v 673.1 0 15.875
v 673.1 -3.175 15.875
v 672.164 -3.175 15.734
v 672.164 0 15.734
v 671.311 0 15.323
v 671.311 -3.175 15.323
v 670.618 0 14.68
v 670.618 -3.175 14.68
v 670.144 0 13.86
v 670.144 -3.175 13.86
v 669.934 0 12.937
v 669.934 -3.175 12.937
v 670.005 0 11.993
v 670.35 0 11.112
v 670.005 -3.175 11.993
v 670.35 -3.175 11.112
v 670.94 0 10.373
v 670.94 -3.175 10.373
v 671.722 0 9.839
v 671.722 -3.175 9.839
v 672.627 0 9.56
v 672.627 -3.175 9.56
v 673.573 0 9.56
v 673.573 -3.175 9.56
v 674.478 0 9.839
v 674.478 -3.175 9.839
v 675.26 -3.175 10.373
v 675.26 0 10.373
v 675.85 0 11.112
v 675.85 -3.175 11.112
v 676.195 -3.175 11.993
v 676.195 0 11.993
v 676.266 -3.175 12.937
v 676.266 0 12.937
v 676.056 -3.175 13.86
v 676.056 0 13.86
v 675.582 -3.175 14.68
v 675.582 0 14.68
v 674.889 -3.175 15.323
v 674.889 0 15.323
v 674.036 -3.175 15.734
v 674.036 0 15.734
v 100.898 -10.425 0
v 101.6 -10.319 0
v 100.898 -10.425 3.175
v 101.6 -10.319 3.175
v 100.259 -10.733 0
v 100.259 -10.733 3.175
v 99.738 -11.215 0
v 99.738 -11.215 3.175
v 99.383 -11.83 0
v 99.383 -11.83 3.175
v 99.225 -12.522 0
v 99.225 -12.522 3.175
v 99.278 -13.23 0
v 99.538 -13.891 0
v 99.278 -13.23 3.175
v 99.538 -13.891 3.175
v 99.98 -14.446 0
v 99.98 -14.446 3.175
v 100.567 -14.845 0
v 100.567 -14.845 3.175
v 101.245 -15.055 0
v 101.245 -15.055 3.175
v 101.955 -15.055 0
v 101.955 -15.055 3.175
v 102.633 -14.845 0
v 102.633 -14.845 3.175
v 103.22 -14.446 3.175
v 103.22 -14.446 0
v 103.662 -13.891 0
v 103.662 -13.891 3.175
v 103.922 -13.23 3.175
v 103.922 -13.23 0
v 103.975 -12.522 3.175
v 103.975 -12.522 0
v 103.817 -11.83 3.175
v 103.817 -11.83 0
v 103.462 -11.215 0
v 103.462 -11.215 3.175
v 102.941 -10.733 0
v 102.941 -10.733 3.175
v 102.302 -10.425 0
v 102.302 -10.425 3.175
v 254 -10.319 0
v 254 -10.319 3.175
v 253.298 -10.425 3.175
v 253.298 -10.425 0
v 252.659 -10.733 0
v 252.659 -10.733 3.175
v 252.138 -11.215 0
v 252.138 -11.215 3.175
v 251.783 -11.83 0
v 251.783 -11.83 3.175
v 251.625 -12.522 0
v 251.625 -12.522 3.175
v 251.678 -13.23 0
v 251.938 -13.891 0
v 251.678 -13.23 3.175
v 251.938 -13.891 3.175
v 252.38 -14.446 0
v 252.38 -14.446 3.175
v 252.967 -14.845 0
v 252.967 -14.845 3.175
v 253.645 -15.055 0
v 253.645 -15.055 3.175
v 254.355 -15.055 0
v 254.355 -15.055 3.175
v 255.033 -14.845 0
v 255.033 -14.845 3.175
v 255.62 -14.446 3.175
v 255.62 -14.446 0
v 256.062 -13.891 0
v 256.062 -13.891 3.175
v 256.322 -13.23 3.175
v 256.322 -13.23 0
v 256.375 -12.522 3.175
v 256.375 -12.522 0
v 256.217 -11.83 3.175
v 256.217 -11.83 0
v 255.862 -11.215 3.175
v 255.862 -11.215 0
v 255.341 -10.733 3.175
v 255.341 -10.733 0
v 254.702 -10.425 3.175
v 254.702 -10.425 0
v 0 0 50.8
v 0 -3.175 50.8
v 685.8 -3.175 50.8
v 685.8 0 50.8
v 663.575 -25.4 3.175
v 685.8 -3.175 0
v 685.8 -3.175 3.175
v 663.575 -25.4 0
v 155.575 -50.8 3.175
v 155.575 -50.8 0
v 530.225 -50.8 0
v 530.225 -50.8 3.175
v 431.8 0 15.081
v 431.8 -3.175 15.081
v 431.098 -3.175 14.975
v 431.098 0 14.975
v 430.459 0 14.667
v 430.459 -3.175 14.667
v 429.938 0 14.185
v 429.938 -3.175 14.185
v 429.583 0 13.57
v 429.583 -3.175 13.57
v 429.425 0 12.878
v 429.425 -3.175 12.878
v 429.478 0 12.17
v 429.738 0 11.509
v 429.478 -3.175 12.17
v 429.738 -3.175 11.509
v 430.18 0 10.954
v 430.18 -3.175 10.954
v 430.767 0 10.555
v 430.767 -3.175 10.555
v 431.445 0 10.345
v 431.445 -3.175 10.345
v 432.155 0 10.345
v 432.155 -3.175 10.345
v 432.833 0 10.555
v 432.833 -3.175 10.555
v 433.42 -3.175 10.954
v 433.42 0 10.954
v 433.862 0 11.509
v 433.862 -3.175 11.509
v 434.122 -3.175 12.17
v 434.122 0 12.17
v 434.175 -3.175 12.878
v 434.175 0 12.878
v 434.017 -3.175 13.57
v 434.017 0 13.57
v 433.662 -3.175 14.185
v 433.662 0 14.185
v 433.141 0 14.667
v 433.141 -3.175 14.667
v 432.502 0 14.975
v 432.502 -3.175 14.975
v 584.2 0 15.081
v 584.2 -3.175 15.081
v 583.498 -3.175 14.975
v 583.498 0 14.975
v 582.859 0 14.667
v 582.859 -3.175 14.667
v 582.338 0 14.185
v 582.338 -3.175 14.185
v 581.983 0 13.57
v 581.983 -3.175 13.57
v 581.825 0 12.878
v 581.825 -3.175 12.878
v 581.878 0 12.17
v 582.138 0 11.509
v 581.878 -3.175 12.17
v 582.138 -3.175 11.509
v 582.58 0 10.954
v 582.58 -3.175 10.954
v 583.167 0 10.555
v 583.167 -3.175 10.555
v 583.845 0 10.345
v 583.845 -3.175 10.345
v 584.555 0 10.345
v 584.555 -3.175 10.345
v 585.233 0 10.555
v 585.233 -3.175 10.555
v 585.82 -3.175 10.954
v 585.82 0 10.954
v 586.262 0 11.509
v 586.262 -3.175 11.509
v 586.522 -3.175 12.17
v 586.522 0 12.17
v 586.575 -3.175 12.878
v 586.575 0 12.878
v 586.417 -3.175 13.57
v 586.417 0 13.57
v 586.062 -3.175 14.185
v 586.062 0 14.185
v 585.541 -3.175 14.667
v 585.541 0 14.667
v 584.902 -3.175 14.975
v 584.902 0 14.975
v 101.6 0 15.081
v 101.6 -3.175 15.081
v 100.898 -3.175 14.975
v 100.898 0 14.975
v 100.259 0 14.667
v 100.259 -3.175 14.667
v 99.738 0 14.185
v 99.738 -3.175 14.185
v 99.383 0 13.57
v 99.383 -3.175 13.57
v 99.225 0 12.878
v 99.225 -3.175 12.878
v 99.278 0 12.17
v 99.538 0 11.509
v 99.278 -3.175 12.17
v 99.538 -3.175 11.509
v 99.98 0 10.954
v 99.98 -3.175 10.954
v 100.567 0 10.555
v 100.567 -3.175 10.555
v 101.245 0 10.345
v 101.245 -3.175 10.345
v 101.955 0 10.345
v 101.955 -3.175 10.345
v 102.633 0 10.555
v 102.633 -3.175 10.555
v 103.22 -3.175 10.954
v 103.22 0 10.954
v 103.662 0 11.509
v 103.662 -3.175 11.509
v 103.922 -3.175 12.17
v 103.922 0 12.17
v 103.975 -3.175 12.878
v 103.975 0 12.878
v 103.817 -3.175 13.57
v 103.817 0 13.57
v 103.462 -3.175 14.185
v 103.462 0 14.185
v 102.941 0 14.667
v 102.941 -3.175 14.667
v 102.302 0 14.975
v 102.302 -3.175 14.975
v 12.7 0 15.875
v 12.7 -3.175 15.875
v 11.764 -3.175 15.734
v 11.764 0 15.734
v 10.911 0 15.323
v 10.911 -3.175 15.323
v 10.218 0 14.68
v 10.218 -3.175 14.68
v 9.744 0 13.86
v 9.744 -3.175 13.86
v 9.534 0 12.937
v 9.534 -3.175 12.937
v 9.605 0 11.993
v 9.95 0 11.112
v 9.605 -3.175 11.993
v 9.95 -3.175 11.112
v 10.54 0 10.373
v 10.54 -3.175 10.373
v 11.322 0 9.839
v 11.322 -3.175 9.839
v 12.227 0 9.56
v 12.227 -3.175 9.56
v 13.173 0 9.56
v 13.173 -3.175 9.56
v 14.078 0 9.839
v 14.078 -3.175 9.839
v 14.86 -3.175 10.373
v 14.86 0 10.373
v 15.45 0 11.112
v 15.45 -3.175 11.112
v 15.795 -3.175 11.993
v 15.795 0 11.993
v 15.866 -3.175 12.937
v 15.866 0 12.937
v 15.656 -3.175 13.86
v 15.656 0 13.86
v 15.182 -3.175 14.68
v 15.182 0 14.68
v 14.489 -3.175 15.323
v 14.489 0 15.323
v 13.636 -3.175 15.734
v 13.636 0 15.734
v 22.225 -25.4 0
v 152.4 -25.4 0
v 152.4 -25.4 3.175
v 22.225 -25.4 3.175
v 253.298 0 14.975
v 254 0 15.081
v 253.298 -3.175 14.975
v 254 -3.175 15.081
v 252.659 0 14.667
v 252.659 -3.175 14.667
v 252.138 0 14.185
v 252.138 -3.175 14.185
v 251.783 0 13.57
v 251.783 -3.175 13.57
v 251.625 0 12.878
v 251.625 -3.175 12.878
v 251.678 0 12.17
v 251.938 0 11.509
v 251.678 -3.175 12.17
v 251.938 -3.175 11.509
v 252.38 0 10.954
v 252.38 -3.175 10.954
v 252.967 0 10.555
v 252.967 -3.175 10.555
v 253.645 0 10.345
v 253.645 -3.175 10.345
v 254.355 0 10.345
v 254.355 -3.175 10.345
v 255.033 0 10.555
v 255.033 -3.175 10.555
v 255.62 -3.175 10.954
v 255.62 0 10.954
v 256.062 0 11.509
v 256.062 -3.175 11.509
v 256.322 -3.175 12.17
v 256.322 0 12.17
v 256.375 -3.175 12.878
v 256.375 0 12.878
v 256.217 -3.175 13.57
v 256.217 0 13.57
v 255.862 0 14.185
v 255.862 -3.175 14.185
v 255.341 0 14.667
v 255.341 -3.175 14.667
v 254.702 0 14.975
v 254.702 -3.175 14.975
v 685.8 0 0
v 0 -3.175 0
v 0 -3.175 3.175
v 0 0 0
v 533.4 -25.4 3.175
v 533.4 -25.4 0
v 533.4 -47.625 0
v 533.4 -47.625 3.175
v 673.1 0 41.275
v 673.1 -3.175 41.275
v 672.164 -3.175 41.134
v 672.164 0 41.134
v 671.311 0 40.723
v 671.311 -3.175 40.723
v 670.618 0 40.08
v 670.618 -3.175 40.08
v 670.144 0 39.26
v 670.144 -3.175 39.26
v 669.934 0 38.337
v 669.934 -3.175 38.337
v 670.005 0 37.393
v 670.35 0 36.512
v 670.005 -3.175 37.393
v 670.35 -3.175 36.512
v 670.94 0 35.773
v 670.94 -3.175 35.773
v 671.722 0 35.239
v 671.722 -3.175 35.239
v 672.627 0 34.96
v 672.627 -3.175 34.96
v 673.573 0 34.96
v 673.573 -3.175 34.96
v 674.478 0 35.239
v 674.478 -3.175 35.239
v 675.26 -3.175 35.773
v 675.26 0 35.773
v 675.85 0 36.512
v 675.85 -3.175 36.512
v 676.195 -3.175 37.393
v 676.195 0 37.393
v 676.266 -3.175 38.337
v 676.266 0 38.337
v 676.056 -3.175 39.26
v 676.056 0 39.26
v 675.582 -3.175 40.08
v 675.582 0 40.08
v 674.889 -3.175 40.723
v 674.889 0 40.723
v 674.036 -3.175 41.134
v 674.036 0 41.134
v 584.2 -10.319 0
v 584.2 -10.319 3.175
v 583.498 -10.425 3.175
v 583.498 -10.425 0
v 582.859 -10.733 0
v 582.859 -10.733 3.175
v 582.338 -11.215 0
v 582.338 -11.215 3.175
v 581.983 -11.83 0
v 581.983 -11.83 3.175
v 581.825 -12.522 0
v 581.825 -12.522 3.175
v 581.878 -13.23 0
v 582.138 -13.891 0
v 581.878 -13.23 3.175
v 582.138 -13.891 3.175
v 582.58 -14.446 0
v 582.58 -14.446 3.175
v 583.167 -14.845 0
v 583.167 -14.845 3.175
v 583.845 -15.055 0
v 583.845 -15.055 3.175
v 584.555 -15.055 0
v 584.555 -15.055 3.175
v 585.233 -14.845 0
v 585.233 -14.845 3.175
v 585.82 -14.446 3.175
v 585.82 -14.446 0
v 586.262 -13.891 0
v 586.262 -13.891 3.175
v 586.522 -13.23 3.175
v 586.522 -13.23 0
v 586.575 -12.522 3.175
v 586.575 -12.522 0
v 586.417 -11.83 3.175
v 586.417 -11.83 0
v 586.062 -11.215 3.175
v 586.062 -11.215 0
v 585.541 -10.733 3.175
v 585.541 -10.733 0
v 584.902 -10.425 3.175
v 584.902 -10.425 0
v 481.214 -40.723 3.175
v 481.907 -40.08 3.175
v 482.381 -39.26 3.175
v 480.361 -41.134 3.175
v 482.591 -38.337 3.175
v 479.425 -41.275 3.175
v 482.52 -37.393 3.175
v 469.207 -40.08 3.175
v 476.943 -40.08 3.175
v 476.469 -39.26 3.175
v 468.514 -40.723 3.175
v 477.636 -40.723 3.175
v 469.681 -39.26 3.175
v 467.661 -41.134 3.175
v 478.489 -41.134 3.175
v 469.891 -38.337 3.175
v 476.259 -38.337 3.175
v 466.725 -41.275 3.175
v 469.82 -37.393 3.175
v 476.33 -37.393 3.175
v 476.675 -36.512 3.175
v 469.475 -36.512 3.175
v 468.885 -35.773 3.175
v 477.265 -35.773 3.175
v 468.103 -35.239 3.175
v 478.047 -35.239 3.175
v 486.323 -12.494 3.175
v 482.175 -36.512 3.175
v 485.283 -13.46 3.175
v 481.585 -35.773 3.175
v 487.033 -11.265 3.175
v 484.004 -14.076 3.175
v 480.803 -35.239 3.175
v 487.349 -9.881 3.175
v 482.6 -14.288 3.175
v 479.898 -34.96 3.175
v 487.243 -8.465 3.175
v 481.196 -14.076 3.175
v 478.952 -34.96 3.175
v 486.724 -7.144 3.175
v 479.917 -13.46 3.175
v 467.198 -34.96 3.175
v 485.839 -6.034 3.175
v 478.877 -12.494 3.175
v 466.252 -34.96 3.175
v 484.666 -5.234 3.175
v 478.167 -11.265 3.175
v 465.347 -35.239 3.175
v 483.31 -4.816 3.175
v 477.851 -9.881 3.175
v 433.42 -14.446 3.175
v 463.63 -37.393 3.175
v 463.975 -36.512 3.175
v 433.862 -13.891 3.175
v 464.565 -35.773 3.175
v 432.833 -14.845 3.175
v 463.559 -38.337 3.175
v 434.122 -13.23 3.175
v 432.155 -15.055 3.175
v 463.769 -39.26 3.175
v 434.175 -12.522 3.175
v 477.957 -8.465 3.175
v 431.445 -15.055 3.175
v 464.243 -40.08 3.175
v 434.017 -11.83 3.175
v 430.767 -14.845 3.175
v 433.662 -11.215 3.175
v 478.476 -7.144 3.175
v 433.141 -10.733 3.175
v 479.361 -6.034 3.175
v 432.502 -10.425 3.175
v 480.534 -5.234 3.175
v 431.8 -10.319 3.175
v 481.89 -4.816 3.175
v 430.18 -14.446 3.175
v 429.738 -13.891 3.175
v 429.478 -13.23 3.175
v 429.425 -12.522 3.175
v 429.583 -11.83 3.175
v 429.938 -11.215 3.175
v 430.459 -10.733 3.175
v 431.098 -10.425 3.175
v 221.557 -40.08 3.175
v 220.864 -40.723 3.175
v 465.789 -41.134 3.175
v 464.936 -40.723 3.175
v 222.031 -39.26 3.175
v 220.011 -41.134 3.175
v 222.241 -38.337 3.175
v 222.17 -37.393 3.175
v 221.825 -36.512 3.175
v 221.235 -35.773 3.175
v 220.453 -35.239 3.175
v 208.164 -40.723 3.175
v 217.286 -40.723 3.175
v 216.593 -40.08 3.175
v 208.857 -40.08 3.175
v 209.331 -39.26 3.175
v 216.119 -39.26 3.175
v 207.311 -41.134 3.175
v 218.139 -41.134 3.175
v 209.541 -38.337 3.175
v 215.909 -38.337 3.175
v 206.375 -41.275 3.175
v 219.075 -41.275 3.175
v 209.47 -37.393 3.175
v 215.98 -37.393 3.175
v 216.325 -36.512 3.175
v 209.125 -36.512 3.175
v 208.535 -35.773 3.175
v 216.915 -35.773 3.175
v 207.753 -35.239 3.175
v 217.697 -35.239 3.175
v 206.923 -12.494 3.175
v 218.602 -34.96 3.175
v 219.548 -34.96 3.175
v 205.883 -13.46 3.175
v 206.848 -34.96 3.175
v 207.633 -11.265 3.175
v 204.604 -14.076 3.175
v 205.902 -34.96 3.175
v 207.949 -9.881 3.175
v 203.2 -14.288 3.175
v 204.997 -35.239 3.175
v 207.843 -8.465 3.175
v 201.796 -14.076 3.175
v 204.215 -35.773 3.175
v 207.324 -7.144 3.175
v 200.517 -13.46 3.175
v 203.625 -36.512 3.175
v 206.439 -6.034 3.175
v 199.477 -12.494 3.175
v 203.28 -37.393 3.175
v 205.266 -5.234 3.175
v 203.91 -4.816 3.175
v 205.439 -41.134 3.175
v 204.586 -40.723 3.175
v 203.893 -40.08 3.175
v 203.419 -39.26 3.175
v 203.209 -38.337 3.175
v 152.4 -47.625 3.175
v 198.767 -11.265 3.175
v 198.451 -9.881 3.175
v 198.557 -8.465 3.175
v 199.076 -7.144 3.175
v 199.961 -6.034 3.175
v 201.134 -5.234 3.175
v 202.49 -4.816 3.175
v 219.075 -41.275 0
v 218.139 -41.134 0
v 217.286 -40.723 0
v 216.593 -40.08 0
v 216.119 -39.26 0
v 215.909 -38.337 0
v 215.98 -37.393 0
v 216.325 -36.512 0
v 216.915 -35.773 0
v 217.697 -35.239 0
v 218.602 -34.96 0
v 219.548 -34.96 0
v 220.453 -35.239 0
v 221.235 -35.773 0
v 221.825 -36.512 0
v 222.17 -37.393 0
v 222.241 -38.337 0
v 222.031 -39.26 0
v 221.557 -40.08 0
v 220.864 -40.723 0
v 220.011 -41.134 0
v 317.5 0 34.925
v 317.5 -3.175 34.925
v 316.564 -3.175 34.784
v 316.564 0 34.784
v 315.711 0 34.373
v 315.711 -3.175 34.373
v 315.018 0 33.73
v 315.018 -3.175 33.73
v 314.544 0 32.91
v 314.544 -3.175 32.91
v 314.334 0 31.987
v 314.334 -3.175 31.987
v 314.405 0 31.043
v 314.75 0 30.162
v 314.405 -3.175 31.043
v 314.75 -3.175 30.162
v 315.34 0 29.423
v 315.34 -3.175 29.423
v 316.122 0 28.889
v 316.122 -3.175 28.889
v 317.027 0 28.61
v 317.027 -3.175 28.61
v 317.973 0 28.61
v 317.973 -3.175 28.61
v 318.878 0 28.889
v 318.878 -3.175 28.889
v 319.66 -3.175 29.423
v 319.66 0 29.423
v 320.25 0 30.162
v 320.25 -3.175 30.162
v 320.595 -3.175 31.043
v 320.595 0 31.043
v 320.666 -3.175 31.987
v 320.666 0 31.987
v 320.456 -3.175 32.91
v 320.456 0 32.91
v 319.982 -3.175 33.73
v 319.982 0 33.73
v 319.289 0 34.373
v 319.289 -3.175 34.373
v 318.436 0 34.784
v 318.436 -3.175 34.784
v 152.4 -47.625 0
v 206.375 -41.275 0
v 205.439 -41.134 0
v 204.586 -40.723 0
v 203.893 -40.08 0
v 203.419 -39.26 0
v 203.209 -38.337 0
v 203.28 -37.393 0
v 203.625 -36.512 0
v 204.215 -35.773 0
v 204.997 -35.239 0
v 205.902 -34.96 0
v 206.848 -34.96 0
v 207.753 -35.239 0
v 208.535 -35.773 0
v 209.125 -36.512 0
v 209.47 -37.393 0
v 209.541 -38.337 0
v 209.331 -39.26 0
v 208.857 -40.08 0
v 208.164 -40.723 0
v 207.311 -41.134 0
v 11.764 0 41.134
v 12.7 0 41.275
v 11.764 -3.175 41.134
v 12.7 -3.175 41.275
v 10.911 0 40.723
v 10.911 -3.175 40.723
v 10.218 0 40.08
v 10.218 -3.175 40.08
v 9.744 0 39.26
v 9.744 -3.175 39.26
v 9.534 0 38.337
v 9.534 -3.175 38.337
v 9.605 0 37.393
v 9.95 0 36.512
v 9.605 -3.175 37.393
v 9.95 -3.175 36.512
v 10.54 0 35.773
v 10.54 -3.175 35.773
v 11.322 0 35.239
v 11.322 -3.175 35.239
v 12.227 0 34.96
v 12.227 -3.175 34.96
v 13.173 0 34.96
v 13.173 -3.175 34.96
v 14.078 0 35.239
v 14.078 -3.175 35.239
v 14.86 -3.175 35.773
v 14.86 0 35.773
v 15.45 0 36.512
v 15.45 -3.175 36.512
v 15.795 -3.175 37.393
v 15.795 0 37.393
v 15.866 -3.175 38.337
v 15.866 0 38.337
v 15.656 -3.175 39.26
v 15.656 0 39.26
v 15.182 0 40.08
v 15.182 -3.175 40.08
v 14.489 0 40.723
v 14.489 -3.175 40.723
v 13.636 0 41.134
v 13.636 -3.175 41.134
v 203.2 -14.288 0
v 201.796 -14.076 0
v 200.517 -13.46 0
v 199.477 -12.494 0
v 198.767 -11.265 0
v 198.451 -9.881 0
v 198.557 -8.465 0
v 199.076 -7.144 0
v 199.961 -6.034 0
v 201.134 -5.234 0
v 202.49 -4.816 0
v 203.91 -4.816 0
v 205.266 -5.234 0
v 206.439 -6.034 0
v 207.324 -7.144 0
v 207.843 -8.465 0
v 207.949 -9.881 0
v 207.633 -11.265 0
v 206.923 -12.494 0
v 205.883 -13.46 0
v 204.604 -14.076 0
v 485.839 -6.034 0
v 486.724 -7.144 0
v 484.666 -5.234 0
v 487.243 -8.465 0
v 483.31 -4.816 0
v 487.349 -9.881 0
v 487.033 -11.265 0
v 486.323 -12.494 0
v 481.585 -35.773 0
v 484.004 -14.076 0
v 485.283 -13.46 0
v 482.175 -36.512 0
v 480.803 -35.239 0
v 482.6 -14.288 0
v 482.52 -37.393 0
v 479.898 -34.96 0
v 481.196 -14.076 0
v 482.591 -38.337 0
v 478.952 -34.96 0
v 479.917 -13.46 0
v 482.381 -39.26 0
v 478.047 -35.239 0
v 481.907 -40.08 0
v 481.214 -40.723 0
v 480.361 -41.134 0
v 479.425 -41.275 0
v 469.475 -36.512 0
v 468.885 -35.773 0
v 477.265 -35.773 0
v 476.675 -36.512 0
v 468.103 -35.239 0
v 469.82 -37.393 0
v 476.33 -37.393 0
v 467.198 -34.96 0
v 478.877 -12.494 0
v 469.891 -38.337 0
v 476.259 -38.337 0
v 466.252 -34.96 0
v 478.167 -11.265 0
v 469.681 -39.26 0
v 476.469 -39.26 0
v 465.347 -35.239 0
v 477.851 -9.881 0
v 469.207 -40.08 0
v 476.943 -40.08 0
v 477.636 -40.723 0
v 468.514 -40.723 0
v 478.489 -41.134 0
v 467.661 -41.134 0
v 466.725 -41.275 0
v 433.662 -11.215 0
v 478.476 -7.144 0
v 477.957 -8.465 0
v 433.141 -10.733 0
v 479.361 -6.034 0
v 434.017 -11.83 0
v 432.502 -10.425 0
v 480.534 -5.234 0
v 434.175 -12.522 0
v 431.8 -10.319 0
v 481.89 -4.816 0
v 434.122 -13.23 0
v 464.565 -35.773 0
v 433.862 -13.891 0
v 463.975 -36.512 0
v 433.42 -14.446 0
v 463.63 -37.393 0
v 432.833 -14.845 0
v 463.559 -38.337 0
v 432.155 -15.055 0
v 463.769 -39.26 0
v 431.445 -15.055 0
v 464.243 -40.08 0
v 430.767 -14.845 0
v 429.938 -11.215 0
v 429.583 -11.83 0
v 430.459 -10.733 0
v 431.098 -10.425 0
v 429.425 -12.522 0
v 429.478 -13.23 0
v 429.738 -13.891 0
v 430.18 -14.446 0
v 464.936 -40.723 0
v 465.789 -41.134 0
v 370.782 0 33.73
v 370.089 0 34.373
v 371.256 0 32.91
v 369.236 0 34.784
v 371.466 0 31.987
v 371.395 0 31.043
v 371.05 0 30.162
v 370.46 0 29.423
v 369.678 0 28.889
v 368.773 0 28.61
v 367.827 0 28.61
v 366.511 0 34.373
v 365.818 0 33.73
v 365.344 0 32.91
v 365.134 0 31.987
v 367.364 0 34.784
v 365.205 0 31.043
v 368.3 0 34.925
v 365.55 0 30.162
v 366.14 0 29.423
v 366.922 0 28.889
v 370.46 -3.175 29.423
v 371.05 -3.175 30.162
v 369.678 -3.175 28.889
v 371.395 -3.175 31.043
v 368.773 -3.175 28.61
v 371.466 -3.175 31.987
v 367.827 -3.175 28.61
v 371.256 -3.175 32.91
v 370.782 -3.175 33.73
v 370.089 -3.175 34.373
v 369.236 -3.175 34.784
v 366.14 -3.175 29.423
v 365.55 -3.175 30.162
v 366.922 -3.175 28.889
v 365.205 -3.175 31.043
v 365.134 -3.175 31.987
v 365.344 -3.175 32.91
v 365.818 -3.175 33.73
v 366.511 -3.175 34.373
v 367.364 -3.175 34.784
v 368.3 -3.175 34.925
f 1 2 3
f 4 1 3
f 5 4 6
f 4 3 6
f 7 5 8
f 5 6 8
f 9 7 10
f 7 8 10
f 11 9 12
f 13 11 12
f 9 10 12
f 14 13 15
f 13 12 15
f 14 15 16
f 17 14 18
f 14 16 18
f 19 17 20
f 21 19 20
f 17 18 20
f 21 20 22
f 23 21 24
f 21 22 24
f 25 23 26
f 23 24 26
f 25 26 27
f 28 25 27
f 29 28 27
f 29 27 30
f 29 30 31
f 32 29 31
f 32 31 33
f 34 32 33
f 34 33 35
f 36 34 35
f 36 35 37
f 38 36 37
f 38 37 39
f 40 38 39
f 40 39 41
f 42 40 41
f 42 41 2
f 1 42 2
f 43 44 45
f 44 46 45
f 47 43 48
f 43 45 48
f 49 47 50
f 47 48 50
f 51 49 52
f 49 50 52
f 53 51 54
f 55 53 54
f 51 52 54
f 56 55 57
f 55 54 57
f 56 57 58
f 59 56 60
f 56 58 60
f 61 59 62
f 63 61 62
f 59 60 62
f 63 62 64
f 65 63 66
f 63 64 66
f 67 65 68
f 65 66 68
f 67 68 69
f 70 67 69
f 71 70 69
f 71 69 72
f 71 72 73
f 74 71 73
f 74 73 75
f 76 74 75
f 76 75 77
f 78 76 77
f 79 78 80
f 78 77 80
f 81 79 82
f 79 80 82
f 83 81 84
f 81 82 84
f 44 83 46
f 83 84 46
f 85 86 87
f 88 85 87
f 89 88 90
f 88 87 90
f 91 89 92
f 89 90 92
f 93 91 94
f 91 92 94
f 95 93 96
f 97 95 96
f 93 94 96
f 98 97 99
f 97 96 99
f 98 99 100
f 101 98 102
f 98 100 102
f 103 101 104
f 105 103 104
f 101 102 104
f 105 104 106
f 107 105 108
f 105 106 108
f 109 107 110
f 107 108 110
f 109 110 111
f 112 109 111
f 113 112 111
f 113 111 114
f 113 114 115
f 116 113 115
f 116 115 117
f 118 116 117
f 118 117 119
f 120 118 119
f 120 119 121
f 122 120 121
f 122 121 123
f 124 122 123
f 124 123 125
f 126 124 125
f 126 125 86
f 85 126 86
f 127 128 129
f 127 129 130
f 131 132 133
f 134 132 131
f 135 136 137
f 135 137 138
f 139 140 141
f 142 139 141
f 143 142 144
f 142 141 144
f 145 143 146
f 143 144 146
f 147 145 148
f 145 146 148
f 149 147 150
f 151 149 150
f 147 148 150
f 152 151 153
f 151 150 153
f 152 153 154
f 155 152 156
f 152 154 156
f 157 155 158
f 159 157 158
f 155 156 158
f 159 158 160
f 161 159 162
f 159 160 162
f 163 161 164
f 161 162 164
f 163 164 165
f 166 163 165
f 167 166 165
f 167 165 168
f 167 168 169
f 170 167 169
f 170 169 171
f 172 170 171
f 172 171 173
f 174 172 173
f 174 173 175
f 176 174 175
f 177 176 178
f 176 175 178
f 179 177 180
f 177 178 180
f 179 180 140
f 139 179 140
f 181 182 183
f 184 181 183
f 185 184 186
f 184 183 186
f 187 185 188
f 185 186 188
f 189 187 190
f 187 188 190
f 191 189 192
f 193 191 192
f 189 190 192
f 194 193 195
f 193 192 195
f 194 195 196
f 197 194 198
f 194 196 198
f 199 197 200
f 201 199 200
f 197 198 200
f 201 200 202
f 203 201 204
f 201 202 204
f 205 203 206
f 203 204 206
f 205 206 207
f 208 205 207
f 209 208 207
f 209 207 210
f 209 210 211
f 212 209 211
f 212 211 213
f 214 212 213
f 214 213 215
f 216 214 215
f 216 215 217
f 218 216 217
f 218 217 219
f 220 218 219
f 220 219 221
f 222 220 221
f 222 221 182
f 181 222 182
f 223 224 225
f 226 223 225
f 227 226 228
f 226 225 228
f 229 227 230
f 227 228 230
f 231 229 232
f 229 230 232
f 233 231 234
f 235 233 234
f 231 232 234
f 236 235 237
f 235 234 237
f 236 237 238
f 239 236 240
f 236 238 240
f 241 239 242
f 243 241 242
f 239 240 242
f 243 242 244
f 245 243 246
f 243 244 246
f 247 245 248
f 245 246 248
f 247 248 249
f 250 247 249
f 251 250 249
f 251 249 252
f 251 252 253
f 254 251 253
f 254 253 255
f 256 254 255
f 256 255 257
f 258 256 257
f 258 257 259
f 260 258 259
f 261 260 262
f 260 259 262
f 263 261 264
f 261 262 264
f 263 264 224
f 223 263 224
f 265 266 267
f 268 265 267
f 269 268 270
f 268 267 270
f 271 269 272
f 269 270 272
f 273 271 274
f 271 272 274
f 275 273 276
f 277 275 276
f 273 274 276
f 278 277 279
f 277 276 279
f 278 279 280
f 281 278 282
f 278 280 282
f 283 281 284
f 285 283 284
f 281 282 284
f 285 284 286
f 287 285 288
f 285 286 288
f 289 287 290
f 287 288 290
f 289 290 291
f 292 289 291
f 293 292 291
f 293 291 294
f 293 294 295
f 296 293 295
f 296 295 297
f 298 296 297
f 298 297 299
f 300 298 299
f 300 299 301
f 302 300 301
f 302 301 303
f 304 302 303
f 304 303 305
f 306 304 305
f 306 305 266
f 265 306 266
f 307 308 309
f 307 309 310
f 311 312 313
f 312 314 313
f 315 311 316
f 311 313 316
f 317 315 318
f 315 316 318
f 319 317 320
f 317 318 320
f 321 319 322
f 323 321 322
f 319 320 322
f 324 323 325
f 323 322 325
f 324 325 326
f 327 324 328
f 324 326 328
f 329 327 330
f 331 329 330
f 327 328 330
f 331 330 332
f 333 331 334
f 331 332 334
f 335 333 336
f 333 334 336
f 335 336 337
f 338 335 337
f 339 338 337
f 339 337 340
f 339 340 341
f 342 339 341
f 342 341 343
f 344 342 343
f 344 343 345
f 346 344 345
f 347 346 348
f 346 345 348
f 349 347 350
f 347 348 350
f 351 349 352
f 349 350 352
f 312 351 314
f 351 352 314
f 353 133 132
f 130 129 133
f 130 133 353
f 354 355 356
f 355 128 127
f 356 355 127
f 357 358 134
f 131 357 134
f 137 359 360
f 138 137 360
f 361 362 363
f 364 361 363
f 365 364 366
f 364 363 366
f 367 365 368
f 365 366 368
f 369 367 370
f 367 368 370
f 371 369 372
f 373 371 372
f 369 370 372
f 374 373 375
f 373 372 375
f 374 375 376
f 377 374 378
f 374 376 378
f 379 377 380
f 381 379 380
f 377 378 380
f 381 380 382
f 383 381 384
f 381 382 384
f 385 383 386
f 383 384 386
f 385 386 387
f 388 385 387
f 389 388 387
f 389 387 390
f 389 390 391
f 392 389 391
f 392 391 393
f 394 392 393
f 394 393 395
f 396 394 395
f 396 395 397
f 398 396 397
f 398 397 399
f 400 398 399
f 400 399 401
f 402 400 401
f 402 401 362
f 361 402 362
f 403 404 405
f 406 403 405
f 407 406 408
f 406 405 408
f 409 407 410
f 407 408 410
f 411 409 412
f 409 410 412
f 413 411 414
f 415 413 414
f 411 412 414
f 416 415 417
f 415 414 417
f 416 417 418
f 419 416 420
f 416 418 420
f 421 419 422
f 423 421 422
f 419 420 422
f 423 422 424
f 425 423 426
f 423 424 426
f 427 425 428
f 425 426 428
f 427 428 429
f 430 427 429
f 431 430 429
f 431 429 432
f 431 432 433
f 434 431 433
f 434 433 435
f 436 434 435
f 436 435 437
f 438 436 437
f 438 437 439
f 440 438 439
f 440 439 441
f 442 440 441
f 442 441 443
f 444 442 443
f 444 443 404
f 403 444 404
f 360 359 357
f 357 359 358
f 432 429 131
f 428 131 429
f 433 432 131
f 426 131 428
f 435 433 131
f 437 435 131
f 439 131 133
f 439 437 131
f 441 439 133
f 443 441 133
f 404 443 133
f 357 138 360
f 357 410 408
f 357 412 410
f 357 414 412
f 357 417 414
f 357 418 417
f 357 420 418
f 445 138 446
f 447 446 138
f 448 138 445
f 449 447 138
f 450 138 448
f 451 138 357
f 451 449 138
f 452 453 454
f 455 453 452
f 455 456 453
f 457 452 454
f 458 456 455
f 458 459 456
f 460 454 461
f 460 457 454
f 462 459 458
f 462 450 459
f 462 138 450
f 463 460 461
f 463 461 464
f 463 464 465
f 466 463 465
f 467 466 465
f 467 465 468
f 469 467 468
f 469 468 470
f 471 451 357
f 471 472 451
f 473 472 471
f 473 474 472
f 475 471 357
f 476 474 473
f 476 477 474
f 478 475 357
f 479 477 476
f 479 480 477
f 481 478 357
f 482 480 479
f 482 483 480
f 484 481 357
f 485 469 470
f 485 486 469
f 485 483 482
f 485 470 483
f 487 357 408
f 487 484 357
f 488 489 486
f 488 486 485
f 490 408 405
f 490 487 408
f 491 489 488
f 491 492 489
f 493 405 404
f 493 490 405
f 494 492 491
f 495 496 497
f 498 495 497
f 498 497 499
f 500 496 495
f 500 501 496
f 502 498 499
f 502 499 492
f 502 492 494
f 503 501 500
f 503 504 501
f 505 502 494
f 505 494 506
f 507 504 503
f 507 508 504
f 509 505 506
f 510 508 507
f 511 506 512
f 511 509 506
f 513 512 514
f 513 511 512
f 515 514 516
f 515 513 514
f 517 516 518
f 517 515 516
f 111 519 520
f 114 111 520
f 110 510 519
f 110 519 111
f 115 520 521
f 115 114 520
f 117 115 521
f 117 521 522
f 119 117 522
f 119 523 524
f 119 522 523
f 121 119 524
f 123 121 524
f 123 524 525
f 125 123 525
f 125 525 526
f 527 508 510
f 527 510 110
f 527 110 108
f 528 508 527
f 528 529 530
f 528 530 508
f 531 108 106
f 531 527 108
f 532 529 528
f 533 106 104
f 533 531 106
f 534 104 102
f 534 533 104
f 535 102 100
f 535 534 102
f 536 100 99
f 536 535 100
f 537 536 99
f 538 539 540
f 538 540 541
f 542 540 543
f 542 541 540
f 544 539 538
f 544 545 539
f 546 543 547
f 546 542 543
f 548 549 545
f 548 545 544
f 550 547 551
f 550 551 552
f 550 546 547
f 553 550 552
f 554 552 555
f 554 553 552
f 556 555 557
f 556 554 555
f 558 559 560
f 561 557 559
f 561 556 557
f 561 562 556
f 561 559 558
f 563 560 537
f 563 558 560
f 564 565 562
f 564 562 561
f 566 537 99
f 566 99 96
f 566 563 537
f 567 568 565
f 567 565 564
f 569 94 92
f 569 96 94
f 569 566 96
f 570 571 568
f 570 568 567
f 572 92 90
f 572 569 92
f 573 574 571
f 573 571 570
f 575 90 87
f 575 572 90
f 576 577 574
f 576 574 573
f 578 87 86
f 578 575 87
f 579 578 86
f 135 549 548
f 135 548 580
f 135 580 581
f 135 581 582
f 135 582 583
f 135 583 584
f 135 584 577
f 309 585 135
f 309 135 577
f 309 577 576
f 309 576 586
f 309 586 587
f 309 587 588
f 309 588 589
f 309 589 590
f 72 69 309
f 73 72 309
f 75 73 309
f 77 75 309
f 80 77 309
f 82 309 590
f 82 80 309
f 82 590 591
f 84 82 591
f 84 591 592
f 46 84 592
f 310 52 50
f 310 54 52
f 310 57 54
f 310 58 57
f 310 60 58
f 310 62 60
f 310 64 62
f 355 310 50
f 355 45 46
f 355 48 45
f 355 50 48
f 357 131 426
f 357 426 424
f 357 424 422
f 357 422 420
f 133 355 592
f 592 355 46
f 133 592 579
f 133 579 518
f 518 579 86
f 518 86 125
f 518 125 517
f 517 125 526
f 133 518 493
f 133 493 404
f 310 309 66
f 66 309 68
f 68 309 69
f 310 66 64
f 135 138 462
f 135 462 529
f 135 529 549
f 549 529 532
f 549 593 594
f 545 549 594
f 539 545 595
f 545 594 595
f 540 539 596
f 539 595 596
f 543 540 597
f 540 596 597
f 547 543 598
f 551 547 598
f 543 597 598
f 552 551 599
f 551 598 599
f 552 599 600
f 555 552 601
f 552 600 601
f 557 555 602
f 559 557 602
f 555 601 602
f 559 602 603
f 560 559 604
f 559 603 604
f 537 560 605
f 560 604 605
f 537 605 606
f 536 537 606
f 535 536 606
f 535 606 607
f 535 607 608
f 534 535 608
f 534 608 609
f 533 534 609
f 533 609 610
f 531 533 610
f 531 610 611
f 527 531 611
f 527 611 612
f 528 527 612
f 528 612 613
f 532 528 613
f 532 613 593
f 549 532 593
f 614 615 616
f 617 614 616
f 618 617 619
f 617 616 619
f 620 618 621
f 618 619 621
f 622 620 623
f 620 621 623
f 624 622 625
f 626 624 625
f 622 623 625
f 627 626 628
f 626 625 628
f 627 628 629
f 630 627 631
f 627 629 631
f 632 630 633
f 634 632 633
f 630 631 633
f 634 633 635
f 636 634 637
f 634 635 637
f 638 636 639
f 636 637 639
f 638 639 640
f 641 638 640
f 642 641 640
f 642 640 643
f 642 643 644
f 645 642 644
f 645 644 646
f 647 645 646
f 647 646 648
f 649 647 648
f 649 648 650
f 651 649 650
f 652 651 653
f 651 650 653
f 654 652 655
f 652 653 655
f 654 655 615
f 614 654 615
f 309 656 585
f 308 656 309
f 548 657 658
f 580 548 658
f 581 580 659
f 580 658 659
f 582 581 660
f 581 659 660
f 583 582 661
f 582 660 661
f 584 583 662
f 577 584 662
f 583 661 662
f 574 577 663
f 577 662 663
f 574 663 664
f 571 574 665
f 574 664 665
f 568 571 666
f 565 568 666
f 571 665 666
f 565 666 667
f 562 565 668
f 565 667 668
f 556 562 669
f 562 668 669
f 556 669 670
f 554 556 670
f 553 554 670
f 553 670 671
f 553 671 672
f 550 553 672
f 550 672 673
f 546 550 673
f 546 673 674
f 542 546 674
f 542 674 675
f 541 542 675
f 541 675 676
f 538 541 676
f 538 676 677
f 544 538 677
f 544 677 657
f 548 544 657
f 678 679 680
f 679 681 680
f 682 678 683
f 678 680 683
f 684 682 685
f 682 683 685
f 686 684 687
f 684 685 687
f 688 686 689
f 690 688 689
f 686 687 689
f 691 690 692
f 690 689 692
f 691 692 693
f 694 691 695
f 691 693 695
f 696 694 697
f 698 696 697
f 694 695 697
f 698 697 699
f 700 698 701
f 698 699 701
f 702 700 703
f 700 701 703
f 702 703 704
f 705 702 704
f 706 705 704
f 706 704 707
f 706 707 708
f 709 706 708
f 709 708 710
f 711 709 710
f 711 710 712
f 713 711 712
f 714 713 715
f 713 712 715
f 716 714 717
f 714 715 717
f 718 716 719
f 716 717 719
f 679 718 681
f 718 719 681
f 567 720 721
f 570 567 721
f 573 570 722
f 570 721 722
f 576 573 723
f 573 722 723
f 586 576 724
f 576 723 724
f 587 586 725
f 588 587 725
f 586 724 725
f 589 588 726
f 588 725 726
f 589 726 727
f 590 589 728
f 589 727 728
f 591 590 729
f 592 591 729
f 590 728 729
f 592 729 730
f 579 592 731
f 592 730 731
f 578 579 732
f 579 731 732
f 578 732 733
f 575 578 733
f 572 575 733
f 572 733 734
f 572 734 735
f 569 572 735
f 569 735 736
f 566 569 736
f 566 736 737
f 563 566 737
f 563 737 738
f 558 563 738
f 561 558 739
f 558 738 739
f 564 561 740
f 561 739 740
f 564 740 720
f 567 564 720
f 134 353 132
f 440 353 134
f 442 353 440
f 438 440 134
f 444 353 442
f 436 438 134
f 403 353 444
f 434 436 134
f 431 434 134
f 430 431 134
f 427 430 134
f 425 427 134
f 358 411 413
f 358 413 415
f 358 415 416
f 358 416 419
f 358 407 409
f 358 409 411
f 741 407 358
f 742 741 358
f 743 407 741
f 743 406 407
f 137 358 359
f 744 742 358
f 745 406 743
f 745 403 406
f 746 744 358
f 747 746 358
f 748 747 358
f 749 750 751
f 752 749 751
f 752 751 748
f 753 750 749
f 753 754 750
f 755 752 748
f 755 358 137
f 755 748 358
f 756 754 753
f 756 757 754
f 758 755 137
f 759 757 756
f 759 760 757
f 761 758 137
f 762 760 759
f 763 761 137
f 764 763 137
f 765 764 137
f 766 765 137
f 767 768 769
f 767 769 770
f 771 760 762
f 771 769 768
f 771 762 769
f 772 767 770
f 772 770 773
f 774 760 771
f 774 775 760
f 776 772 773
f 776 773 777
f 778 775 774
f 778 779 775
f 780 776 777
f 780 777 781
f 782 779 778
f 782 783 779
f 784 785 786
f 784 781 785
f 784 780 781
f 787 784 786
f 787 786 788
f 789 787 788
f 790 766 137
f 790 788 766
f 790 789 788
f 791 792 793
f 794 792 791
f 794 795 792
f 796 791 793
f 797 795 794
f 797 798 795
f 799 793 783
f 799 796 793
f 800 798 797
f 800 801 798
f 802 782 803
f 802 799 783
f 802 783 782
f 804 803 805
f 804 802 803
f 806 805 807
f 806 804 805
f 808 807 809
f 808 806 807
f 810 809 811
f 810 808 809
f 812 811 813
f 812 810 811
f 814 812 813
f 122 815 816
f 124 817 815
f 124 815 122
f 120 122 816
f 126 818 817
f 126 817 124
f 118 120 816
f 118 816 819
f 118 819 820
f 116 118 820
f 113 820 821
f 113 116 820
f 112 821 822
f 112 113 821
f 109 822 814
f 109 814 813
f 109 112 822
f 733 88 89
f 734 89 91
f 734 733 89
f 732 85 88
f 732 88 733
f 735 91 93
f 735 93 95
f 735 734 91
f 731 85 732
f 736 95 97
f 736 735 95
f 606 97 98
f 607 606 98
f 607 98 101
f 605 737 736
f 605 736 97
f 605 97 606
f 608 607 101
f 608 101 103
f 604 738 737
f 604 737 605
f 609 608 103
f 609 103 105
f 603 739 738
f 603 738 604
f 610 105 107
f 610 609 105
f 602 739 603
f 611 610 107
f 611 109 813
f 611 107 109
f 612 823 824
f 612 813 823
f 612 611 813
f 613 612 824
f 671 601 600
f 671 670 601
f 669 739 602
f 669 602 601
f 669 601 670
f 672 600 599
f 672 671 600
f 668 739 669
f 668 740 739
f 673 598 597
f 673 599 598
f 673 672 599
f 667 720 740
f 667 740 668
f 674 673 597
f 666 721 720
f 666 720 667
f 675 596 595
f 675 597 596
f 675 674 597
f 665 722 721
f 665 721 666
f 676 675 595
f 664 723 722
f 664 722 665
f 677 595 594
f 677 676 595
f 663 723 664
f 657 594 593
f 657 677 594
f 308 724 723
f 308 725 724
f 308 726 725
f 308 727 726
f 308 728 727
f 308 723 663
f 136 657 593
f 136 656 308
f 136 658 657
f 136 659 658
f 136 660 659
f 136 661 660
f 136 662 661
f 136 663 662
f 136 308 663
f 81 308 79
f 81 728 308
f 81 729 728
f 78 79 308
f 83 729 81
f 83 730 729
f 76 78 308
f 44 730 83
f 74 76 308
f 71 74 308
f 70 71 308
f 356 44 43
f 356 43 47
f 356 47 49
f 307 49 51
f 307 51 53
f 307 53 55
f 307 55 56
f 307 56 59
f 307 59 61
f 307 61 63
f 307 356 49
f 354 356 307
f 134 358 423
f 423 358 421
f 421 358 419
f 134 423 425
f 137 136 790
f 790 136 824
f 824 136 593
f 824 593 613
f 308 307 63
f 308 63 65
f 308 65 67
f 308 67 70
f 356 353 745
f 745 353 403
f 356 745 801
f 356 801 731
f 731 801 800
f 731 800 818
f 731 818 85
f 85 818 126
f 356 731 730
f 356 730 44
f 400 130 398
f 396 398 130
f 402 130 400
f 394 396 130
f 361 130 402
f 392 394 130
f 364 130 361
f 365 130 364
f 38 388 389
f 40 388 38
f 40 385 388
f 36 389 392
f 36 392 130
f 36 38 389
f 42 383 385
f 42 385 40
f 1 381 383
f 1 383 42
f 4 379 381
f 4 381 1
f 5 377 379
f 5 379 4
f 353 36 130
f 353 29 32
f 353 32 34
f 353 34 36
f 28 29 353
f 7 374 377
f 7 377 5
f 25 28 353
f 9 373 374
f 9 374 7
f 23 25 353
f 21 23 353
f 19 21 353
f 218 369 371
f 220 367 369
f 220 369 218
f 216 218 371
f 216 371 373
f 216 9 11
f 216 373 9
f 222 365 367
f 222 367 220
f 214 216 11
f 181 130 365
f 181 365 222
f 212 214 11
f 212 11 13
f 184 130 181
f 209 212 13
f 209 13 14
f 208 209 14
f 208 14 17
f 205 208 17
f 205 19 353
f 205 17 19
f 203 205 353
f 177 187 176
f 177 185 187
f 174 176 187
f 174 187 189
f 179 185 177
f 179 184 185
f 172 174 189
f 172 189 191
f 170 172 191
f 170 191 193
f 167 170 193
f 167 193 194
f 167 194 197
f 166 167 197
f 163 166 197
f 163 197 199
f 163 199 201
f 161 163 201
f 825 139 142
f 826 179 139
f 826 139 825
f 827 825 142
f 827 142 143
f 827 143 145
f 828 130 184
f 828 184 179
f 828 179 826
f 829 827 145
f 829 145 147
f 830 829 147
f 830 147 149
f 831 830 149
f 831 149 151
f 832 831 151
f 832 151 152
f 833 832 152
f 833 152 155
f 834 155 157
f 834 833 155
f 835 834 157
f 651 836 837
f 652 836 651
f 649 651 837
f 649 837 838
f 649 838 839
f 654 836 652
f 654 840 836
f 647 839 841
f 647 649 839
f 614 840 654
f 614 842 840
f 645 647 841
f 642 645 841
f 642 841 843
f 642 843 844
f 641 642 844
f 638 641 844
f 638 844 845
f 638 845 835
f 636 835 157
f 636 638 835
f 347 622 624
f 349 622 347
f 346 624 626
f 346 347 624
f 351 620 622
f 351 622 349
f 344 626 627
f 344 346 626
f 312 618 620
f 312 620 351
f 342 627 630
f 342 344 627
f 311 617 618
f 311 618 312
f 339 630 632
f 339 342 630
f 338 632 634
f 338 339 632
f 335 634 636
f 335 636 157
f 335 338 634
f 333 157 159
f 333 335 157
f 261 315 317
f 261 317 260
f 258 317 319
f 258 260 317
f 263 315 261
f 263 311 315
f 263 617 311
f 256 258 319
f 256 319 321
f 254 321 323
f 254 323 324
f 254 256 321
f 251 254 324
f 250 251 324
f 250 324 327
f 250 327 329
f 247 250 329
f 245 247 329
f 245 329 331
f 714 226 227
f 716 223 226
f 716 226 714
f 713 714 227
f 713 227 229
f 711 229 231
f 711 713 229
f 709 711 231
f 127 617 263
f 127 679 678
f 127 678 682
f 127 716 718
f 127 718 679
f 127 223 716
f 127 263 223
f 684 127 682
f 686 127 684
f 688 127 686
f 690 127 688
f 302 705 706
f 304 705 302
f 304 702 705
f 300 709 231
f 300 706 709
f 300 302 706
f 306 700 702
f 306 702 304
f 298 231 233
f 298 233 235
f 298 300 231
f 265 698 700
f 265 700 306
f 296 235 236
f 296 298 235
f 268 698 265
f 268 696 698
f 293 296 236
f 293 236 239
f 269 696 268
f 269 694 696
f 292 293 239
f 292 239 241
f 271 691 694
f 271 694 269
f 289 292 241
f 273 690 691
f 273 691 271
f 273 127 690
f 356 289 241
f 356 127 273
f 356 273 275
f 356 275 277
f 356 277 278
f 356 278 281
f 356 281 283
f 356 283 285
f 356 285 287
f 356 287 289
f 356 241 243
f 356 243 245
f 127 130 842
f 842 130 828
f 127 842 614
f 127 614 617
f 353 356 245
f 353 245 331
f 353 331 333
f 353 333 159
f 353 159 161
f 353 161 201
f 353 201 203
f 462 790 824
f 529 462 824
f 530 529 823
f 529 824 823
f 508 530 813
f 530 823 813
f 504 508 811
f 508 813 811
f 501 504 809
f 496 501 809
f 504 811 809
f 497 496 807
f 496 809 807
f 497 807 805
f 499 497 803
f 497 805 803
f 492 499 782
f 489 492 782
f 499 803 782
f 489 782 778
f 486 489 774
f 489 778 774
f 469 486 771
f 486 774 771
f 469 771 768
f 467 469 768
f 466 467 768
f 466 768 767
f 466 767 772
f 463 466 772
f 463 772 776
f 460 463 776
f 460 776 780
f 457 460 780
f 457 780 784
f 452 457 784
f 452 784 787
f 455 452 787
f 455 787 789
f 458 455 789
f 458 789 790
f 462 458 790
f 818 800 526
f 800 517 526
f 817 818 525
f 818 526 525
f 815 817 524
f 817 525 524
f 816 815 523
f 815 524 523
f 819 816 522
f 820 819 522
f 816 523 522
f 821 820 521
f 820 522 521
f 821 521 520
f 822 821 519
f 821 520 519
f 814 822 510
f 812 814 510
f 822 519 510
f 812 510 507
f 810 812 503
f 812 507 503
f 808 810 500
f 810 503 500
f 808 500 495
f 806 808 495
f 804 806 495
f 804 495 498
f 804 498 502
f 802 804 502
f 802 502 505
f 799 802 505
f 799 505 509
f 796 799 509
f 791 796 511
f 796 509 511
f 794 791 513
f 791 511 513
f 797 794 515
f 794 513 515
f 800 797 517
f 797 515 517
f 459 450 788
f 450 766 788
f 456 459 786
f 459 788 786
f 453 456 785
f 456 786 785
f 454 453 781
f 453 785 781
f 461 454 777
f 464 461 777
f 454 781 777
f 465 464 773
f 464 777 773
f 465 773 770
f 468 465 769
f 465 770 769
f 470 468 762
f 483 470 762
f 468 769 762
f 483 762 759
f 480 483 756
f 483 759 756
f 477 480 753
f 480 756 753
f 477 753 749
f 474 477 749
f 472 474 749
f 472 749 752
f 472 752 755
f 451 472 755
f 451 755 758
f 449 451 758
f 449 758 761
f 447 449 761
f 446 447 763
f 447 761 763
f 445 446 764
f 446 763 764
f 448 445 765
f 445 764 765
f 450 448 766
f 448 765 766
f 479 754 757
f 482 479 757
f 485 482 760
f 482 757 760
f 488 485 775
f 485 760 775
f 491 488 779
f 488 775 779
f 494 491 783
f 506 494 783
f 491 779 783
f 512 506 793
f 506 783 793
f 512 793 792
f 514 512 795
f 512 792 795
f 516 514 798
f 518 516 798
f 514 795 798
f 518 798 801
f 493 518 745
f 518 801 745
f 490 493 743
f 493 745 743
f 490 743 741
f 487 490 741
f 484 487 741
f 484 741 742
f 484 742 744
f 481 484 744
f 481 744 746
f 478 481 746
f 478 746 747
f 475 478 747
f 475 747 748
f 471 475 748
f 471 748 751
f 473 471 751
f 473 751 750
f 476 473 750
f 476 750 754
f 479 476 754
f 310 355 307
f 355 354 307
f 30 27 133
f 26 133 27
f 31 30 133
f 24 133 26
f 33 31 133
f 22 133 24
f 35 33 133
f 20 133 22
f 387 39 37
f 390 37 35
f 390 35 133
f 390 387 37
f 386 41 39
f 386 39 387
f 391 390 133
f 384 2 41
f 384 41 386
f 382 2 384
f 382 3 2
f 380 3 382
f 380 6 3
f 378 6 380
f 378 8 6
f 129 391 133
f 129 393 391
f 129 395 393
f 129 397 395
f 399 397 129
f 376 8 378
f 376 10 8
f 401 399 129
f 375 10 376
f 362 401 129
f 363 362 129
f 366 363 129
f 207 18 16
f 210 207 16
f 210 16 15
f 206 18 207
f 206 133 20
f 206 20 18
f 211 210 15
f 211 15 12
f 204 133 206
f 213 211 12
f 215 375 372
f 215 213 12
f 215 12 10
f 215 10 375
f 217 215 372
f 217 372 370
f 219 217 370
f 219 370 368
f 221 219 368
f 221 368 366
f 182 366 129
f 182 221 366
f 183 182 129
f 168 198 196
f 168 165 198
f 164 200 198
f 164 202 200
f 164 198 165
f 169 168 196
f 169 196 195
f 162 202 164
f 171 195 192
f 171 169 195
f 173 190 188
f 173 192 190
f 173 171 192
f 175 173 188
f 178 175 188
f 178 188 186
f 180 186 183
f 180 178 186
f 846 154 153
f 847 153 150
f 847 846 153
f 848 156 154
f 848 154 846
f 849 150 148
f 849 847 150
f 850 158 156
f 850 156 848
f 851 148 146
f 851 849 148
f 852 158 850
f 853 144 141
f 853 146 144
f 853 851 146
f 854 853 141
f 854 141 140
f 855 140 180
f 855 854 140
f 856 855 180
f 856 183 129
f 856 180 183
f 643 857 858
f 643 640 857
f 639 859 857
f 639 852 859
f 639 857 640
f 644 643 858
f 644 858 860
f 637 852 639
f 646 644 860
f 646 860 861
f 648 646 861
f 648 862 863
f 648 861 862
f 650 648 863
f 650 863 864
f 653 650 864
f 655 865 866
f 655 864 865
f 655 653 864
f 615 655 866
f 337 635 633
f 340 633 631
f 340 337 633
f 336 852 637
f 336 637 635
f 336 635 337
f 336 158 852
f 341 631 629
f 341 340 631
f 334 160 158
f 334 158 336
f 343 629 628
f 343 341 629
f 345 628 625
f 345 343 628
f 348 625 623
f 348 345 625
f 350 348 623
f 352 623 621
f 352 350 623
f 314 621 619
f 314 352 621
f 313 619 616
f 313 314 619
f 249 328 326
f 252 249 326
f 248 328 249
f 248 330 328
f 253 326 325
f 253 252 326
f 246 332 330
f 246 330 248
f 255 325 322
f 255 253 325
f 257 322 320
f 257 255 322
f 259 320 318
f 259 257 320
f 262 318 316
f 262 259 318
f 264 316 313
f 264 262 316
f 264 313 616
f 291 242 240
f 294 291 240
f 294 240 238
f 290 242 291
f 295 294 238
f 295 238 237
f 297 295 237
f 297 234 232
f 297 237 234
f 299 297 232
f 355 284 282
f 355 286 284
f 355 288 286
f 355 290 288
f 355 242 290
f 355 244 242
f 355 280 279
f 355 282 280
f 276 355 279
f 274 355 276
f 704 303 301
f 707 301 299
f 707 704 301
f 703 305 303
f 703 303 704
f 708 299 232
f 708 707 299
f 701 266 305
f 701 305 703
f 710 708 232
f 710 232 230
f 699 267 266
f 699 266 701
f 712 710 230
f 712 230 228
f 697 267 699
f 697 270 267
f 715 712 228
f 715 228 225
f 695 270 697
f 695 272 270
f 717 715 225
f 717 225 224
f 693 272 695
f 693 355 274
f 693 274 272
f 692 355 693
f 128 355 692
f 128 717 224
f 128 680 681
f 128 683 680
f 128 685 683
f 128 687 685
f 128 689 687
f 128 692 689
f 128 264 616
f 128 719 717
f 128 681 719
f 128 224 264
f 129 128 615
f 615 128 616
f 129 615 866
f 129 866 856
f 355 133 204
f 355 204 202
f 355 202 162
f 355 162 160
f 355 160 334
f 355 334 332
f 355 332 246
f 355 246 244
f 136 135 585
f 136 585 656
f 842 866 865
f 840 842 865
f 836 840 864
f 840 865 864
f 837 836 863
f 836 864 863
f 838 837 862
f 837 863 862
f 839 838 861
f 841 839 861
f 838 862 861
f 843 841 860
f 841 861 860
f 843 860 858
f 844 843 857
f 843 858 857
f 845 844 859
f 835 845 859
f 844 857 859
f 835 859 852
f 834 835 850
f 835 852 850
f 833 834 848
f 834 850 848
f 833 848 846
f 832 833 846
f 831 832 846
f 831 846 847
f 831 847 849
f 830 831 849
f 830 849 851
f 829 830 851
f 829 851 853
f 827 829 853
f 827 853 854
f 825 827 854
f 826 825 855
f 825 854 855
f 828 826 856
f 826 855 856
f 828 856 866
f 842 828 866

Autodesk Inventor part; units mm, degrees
ref_plane "YZ Plane" through (0, 0, 0) normal (1, 0, 0) x (0, 1, 0)
ref_plane "XZ Plane" through (0, 0, 0) normal (0, 1, 0) x (-1, 0, 0)
ref_plane "XY Plane" through (0, 0, 0) normal (0, 0, 1) x (1, 0, 0)
sketch "Sketch1" plane through (0, 0, 0) normal (1, 0, 0) x (0, 1, 0)
  line L0 (0, 0) -> (-3.175, 0)
  line L1 (-3.175, 0) -> (-3.175, 50.8)
  line L2 (-3.175, 50.8) -> (0, 50.8)
  line L3 (0, 50.8) -> (0, 0)
  line L4 (0, 0) -> (-50.8, 0)
  line L5 (-50.8, 0) -> (-50.8, 3.175)
  line L6 (-50.8, 3.175) -> (0, 3.175)
  line L7 (0, 3.175) -> (0, 0)
  dimension "d0" = 3.175
  dimension "d1" = 50.8
  dimension "d2" = 50.8
  dimension "d3" = 3.175
extrude "Extrusion1" add sketch "Sketch1" along normal blind 685.8
sketch "Sketch2" plane through (0, -50.8, 3.175) normal (0, 0, 1) x (1, 0, 0)
  line L0 (0, 47.625) -> (0, 0) projected
  line L1 (0, 0) -> (685.8, 0) projected
  point P0 (0, 50.8)
  point P1 (206.375, 12.7)
  point P2 (479.425, 12.7)
  point P3 (219.075, 12.7)
  point P4 (466.725, 12.7)
  dimension "d9" = 12.7
  dimension "d11" = 12.7
  dimension "d117" = 12.7
  dimension "d118" = 12.7
  dimension "d121" = 12.7
  dimension "d122" = 12.7
  dimension "d130" = 206.375
  dimension "d131" = 247.65
sketch "Sketch3" plane through (0, 0, 50.8) normal (0, 1, 0) x (1, 0, 0)
  line L0 (0, 50.8) -> (0, 0) projected
  line L1 (0, 0) -> (685.8, 0) projected
  line L2 (685.8, 50.8) -> (685.8, 0) projected
  line L3 (0, 50.8) -> (685.8, 50.8) projected
  point P0 (12.7, 12.7)
  point P1 (12.7, 38.1)
  point P2 (317.5, 19.05)
  point P3 (368.3, 19.05)
  point P4 (673.1, 12.7)
  point P5 (673.1, 38.1)
  dimension "d19" = 12.7
  dimension "d20" = 12.7
  dimension "d21" = 12.7
  dimension "d22" = 12.7
  dimension "d23" = 19.05
  dimension "d24" = 19.05
  dimension "d25" = 12.7
  dimension "d26" = 12.7
  dimension "d27" = 12.7
  dimension "d28" = 12.7
  dimension "d29" = 317.5
  dimension "d30" = 317.5
hole "Hole2" at (12.7, 0, 38.1) at (12.7, 0, 12.7) at (317.5, 0, 31.75) at (368.3, 0, 31.75) at (673.1, 0, 38.1) at (673.1, 0, 12.7) direction (0, -1, 0) diameter 6.35 end through all
sketch "Sketch4" plane through (0, 0, 50.8) normal (0, 1, 0) x (1, 0, 0)
  line L0 (0, 50.8) -> (0, 0) projected
  line L1 (685.8, 50.8) -> (685.8, 0) projected
  line L2 (0, 50.8) -> (685.8, 50.8) projected
  point P0 (101.6, 38.1)
  point P1 (254, 38.1)
  point P2 (431.8, 38.1)
  point P3 (584.2, 38.1)
  dimension "d38" = 101.6
  dimension "d39" = 254
  dimension "d40" = 254
  dimension "d41" = 101.6
  dimension "d42" = 12.7
  dimension "d43" = 12.7
  dimension "d44" = 12.7
  dimension "d45" = 12.7
hole "Hole3" at (101.6, 0, 12.7) at (254, 0, 12.7) at (431.8, 0, 12.7) at (584.2, 0, 12.7) direction (0, -1, 0) diameter 4.7625 end through all
sketch "Sketch6" plane through (0, -50.8, 0) normal (0, 0, -1) x (-1, 0, 0)
  line L0 (0, 0) -> (0, 50.8) projected
  line L1 (-685.8, 0) -> (-685.8, 50.8) projected
  line L2 (-685.8, 0) -> (-533.4, 0)
  line L3 (-533.4, 0) -> (-533.4, 25.4)
  line L4 (-533.4, 25.4) -> (-685.8, 25.4)
  line L5 (-685.8, 25.4) -> (-685.8, 0)
  line L6 (0, 0) -> (-152.4, 0)
  line L7 (-152.4, 0) -> (-152.4, 25.4)
  line L8 (-152.4, 25.4) -> (0, 25.4)
  line L9 (0, 25.4) -> (0, 0)
  line L10 (-685.8, 47.625) -> (-663.575, 25.4)
  line L11 (-685.8, 47.625) -> (-654.3691, 47.625) construction
  line L12 (-663.575, 25.4) -> (-685.8, 25.4)
  line L13 (-685.8, 25.4) -> (-685.8, 47.625)
  line L14 (0, 47.625) -> (-22.225, 25.4)
  line L15 (0, 47.625) -> (31.4309, 47.625) construction
  line L16 (-22.225, 25.4) -> (0, 25.4)
  line L17 (0, 25.4) -> (0, 47.625)
  line L18 (0, 47.625) -> (-685.8, 47.625) projected
  dimension "d65" = 152.4
  dimension "d66" = 25.4
  dimension "d67" = 152.4
  dimension "d68" = 25.4
  dimension "d69" = 45
  dimension "d70" = 135
extrude "Extrusion3" cut sketch "Sketch6" against normal blind 25.4
chamfer "Chamfer1" distance 3.175 angle 45 2 edges at (533.4, -50.8, 1.5875) (152.4, -50.8, 1.5875)
sketch "Sketch8" plane through (685.8, 0, 0) normal (0, 0, -1) x (-1, 0, 0)
  line L0 (685.8, 0) -> (0, 0) projected
  line L1 (0, -3.175) -> (0, 0) projected
  point P0 (101.6, -12.7)
  point P1 (254, -12.7)
  point P2 (431.8, -12.7)
  point P3 (584.2, -12.7)
  dimension "d91" = 12.7
  dimension "d92" = 12.7
  dimension "d93" = 12.7
  dimension "d94" = 12.7
  dimension "d95" = 101.6
  dimension "d96" = 254
  dimension "d97" = 431.8
  dimension "d98" = 584.2
hole "Hole5" at (584.2, -12.7, 0) at (431.8, -12.7, 0) at (254, -12.7, 0) at (101.6, -12.7, 0) direction (0, 0, 1) diameter 4.7625 end through all
sketch "Sketch9" plane through (0, -3.175, 3.175) normal (0, 0, 1) x (1, 0, 0)
  line L0 (0, 0) -> (685.8, 0) projected
  line L1 (0, 3.175) -> (0, 0) projected
  line L2 (685.8, 0) -> (685.8, 3.175) projected
  point P0 (203.2, -6.35)
  point P1 (482.6, -6.35)
  dimension "d106" = 203.2
  dimension "d107" = 6.35
  dimension "d108" = 6.35
  dimension "d109" = 203.2
hole "Hole6" at (203.2, -9.525, 3.175) at (482.6, -9.525, 3.175) direction (0, 0, -1) diameter 9.525 depth 25.4 tip angle 118
hole "Hole7" at (206.375, -38.1, 3.175) at (479.425, -38.1, 3.175) at (219.075, -38.1, 3.175) at (466.725, -38.1, 3.175) direction (0, 0, -1) diameter 6.35 depth 25.4 tip angle 118
properties part number "2x2 angle rail support" material "Aluminum 6061"
